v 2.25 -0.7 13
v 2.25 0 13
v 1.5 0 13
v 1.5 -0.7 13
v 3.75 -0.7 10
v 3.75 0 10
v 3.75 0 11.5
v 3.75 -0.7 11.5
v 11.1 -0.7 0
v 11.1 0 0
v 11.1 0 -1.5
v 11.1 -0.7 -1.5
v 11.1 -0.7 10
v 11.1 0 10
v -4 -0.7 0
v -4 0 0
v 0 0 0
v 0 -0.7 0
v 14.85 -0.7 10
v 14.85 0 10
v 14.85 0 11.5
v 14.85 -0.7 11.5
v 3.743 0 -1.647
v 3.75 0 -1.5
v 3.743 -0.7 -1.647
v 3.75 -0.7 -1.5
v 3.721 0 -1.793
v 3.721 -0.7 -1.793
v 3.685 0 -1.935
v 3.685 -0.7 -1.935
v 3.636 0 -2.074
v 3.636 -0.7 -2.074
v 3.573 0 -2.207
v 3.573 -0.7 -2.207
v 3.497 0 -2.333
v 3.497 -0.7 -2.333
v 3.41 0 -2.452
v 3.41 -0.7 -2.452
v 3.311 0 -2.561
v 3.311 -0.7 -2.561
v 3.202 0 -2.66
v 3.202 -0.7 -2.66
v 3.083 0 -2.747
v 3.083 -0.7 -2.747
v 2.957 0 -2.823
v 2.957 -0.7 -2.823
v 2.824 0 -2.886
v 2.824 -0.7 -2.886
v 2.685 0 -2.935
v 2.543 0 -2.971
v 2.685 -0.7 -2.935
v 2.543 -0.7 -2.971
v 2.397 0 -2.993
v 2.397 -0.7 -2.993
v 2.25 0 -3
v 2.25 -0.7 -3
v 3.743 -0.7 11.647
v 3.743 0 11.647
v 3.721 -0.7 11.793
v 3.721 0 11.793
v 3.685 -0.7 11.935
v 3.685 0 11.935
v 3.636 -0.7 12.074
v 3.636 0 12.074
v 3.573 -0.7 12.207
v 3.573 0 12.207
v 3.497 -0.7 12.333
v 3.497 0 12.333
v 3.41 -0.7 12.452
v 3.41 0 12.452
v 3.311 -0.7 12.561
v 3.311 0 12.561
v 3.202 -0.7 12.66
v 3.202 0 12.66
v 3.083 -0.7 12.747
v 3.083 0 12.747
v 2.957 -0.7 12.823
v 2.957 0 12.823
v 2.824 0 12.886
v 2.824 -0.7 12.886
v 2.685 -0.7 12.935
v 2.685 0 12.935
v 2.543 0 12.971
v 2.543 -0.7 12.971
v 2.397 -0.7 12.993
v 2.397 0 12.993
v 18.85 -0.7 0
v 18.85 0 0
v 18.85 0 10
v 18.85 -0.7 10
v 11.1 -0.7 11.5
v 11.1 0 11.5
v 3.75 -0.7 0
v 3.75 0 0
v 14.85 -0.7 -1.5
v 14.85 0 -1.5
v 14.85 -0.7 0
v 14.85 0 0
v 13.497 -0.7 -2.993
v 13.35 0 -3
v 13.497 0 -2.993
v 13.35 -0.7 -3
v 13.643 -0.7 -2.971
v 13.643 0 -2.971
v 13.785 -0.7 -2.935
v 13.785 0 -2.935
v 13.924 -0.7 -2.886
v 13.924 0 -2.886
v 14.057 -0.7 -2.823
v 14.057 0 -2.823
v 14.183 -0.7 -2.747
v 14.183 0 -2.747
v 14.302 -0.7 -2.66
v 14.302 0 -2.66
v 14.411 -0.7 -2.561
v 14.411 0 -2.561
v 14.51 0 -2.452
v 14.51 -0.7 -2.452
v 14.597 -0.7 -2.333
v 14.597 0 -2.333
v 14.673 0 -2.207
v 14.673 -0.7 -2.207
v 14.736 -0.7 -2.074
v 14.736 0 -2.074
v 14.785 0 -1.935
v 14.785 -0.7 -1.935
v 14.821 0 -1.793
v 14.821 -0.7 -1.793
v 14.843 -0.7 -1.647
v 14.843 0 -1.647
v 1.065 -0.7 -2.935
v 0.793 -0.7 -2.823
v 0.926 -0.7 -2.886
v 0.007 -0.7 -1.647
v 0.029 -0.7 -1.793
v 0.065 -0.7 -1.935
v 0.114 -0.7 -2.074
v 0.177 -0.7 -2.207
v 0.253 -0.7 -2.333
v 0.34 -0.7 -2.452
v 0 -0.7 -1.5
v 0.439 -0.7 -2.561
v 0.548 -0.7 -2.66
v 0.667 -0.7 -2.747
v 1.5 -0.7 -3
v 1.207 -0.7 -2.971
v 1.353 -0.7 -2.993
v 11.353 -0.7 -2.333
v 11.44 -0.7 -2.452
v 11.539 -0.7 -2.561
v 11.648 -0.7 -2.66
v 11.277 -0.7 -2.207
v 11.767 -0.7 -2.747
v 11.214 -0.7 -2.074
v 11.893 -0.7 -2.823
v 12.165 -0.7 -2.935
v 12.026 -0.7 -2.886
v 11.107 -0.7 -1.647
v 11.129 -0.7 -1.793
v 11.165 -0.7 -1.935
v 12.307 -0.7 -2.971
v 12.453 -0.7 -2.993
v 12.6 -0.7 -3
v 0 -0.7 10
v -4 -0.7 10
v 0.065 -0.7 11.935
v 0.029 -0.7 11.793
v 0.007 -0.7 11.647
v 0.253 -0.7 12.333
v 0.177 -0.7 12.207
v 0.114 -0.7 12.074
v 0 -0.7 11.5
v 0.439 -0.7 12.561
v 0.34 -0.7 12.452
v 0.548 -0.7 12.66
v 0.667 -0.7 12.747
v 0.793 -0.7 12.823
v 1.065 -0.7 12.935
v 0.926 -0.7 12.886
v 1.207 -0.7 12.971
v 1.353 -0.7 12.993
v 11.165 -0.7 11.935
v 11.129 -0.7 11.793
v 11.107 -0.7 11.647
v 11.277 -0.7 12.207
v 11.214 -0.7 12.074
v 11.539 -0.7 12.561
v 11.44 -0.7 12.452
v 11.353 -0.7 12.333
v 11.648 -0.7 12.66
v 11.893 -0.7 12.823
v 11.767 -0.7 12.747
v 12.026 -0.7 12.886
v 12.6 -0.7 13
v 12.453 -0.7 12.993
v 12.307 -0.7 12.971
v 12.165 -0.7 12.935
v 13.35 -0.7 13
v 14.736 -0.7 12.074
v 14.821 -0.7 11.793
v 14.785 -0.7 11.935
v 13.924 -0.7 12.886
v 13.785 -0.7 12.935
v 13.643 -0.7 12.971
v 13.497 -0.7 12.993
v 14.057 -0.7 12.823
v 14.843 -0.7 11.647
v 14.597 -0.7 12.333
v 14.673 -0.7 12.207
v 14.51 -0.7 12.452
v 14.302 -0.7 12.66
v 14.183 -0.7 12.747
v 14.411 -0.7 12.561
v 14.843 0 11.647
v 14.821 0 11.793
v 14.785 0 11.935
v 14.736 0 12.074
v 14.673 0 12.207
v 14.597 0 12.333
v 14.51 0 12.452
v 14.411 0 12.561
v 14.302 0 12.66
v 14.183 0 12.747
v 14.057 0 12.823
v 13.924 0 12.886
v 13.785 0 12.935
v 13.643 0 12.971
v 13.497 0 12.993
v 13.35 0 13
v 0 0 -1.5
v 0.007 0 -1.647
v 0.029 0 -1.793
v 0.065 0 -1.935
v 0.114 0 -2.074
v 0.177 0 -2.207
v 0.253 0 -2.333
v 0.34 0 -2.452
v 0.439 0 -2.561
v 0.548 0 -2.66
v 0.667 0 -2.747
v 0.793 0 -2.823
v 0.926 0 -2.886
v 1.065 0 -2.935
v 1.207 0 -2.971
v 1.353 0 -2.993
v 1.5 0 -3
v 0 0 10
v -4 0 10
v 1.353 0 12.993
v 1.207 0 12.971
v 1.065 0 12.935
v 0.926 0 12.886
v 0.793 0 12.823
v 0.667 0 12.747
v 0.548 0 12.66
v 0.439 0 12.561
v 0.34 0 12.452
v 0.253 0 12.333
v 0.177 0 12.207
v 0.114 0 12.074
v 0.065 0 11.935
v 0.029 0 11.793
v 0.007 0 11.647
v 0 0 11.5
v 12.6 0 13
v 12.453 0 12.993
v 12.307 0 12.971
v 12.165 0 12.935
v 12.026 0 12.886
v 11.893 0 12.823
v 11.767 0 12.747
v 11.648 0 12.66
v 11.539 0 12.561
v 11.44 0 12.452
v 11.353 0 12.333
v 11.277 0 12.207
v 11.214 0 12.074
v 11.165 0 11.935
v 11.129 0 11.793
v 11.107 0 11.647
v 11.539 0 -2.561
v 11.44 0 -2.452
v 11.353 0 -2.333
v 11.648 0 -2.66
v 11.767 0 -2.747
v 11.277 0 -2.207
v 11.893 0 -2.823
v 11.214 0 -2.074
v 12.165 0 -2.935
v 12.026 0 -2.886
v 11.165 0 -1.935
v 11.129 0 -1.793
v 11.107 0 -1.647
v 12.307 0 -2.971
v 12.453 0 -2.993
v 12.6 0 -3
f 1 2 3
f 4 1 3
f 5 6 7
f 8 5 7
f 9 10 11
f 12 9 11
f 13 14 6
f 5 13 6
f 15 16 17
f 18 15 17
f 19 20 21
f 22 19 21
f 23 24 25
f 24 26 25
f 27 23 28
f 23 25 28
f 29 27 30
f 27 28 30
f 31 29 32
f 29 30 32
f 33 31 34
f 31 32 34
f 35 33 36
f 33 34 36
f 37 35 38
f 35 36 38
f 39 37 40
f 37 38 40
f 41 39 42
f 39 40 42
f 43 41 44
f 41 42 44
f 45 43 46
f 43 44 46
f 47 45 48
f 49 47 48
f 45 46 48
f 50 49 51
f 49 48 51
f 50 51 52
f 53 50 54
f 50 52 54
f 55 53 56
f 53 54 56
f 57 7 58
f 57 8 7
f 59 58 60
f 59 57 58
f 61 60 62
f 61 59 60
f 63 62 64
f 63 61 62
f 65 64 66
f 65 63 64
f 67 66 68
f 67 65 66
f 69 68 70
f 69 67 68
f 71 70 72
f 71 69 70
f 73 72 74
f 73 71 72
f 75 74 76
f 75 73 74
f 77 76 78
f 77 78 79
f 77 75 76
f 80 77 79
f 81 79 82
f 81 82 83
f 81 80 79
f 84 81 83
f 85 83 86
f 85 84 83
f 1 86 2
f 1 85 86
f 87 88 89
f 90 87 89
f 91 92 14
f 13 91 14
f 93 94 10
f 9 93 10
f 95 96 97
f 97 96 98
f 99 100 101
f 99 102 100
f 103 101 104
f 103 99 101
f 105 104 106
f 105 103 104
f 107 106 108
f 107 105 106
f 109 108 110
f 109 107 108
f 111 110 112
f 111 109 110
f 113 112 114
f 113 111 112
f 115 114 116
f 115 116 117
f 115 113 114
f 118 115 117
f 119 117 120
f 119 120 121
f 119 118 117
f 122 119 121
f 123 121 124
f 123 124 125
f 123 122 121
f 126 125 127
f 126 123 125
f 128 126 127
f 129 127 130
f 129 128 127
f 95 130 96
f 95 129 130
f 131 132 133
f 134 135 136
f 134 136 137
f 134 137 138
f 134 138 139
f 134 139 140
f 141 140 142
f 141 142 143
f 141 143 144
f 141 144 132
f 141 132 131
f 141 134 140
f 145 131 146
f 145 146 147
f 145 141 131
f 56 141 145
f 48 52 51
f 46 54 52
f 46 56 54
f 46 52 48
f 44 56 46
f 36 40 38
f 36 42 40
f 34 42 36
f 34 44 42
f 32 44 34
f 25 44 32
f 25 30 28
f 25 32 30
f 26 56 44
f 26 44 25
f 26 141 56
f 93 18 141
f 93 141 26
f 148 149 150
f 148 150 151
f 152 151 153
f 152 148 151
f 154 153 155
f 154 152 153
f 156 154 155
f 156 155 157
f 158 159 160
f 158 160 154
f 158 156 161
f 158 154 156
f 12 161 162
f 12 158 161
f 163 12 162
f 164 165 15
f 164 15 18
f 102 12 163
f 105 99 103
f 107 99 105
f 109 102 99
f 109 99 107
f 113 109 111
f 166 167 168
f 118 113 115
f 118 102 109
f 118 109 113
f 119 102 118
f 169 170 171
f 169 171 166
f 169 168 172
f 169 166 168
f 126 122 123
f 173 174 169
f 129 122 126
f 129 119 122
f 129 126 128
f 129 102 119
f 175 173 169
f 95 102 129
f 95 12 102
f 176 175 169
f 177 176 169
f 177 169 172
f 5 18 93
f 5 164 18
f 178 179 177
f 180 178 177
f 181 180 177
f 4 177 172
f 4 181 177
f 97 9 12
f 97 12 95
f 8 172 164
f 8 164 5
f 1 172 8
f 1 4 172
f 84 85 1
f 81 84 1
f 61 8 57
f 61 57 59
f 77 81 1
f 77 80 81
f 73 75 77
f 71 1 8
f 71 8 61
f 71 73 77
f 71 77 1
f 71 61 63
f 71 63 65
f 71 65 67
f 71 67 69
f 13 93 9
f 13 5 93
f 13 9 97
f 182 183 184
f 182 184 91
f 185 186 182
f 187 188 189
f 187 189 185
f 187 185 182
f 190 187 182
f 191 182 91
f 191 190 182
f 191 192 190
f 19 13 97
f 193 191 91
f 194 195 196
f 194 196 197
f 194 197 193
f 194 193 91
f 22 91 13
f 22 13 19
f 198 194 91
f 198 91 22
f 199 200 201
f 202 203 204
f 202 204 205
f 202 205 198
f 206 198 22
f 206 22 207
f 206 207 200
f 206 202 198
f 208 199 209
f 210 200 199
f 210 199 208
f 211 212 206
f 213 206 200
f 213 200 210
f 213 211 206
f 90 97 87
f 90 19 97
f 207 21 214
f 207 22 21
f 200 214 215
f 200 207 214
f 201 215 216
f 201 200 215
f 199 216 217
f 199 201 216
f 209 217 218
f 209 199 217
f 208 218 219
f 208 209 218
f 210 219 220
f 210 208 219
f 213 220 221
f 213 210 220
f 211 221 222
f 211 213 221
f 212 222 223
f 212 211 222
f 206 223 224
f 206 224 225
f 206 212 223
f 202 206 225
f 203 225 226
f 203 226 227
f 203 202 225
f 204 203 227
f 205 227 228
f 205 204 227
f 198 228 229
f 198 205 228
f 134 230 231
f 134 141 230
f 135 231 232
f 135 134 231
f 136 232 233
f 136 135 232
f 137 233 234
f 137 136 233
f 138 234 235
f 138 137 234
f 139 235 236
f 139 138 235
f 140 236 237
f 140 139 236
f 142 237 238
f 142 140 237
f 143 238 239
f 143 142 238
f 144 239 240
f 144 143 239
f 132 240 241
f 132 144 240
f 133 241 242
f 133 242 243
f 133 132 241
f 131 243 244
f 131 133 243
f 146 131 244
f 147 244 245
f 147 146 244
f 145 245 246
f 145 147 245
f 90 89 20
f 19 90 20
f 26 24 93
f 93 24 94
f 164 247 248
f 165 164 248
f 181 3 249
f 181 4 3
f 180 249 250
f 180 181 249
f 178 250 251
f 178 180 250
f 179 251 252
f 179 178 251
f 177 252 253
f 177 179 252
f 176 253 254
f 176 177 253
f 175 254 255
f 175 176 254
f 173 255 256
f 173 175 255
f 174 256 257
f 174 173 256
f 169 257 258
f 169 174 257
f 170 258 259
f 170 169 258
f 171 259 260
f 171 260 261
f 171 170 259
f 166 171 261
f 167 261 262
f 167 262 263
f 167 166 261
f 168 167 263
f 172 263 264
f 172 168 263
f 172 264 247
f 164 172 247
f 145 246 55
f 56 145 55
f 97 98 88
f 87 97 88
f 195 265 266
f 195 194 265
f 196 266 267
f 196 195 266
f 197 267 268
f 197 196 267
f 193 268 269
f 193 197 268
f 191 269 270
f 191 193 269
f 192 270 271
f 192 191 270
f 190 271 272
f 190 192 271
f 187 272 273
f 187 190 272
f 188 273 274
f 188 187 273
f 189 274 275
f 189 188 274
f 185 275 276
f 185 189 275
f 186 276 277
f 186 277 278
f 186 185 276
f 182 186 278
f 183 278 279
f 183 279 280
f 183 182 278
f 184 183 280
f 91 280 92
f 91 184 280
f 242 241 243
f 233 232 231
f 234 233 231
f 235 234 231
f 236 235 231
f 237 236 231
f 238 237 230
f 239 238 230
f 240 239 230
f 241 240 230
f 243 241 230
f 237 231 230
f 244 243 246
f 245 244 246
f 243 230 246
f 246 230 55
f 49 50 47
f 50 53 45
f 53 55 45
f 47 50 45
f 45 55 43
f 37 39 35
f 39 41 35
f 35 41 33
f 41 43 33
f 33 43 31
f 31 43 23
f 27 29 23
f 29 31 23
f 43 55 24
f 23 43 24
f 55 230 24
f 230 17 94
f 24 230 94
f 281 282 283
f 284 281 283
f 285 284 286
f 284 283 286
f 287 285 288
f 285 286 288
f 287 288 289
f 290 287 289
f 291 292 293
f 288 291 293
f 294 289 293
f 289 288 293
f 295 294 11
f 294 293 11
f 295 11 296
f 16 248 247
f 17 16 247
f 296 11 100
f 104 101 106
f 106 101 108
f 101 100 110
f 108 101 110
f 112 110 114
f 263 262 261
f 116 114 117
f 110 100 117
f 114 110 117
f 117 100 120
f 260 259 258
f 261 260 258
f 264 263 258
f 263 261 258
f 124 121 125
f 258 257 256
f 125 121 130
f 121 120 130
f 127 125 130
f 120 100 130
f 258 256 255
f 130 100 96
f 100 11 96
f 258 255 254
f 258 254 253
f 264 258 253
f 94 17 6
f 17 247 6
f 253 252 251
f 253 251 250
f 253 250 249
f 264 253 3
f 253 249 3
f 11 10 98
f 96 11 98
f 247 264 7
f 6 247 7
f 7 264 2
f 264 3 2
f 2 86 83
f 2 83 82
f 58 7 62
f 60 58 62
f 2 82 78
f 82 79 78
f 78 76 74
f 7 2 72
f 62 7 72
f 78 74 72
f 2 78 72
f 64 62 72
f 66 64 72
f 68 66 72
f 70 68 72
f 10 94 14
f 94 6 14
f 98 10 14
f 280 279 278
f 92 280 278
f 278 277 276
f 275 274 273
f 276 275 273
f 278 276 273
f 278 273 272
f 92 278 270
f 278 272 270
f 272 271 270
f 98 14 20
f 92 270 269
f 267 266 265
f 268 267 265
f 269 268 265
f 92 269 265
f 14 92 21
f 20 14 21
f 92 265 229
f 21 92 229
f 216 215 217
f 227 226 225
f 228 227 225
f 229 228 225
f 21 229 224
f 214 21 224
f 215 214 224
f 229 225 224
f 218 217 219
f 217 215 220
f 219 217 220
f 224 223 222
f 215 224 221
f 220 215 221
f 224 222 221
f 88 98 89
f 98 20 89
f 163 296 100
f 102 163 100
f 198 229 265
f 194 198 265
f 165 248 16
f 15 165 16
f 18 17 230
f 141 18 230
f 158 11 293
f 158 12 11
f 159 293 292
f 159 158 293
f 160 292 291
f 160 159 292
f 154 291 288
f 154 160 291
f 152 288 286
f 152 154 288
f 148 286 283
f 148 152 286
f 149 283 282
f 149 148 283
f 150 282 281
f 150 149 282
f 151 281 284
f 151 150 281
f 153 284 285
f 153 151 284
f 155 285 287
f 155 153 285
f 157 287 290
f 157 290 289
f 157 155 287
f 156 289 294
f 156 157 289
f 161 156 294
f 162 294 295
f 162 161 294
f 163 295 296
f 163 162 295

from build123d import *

# Parameters (mm, degrees)
F1_DEPTH = 0.7
F2_R     = 1.5


with BuildPart() as f1:
    # F0 (on Front) → F1 (new body)
    with BuildSketch(Plane.XZ):
        Polygon((3.75, -3), (3.75, 0), (11.1, 0), (11.1, -3), (14.85, -3), (14.85, 0), (18.85, 0), (18.85, 10), (14.85, 10), (14.85, 13), (11.1, 13), (11.1, 10), (3.75, 10), (3.75, 13), (0, 13), (0, 10), (-4, 10), (-4, 0), (0, 0), (0, -3), align=None)
    extrude(amount=F1_DEPTH)

    # F2
    f2_edges = [f1.edges().sort_by_distance(p)[0] for p in [
        (0, -0.35, 13),
        (3.75, -0.35, 13),
        (11.1, -0.35, 13),
        (14.85, -0.35, 13),
        (0, -0.35, -3),
        (3.75, -0.35, -3),
        (11.1, -0.35, -3),
        (14.85, -0.35, -3),
    ]]
    fillet(f2_edges, radius=F2_R)


solid = f1.part
